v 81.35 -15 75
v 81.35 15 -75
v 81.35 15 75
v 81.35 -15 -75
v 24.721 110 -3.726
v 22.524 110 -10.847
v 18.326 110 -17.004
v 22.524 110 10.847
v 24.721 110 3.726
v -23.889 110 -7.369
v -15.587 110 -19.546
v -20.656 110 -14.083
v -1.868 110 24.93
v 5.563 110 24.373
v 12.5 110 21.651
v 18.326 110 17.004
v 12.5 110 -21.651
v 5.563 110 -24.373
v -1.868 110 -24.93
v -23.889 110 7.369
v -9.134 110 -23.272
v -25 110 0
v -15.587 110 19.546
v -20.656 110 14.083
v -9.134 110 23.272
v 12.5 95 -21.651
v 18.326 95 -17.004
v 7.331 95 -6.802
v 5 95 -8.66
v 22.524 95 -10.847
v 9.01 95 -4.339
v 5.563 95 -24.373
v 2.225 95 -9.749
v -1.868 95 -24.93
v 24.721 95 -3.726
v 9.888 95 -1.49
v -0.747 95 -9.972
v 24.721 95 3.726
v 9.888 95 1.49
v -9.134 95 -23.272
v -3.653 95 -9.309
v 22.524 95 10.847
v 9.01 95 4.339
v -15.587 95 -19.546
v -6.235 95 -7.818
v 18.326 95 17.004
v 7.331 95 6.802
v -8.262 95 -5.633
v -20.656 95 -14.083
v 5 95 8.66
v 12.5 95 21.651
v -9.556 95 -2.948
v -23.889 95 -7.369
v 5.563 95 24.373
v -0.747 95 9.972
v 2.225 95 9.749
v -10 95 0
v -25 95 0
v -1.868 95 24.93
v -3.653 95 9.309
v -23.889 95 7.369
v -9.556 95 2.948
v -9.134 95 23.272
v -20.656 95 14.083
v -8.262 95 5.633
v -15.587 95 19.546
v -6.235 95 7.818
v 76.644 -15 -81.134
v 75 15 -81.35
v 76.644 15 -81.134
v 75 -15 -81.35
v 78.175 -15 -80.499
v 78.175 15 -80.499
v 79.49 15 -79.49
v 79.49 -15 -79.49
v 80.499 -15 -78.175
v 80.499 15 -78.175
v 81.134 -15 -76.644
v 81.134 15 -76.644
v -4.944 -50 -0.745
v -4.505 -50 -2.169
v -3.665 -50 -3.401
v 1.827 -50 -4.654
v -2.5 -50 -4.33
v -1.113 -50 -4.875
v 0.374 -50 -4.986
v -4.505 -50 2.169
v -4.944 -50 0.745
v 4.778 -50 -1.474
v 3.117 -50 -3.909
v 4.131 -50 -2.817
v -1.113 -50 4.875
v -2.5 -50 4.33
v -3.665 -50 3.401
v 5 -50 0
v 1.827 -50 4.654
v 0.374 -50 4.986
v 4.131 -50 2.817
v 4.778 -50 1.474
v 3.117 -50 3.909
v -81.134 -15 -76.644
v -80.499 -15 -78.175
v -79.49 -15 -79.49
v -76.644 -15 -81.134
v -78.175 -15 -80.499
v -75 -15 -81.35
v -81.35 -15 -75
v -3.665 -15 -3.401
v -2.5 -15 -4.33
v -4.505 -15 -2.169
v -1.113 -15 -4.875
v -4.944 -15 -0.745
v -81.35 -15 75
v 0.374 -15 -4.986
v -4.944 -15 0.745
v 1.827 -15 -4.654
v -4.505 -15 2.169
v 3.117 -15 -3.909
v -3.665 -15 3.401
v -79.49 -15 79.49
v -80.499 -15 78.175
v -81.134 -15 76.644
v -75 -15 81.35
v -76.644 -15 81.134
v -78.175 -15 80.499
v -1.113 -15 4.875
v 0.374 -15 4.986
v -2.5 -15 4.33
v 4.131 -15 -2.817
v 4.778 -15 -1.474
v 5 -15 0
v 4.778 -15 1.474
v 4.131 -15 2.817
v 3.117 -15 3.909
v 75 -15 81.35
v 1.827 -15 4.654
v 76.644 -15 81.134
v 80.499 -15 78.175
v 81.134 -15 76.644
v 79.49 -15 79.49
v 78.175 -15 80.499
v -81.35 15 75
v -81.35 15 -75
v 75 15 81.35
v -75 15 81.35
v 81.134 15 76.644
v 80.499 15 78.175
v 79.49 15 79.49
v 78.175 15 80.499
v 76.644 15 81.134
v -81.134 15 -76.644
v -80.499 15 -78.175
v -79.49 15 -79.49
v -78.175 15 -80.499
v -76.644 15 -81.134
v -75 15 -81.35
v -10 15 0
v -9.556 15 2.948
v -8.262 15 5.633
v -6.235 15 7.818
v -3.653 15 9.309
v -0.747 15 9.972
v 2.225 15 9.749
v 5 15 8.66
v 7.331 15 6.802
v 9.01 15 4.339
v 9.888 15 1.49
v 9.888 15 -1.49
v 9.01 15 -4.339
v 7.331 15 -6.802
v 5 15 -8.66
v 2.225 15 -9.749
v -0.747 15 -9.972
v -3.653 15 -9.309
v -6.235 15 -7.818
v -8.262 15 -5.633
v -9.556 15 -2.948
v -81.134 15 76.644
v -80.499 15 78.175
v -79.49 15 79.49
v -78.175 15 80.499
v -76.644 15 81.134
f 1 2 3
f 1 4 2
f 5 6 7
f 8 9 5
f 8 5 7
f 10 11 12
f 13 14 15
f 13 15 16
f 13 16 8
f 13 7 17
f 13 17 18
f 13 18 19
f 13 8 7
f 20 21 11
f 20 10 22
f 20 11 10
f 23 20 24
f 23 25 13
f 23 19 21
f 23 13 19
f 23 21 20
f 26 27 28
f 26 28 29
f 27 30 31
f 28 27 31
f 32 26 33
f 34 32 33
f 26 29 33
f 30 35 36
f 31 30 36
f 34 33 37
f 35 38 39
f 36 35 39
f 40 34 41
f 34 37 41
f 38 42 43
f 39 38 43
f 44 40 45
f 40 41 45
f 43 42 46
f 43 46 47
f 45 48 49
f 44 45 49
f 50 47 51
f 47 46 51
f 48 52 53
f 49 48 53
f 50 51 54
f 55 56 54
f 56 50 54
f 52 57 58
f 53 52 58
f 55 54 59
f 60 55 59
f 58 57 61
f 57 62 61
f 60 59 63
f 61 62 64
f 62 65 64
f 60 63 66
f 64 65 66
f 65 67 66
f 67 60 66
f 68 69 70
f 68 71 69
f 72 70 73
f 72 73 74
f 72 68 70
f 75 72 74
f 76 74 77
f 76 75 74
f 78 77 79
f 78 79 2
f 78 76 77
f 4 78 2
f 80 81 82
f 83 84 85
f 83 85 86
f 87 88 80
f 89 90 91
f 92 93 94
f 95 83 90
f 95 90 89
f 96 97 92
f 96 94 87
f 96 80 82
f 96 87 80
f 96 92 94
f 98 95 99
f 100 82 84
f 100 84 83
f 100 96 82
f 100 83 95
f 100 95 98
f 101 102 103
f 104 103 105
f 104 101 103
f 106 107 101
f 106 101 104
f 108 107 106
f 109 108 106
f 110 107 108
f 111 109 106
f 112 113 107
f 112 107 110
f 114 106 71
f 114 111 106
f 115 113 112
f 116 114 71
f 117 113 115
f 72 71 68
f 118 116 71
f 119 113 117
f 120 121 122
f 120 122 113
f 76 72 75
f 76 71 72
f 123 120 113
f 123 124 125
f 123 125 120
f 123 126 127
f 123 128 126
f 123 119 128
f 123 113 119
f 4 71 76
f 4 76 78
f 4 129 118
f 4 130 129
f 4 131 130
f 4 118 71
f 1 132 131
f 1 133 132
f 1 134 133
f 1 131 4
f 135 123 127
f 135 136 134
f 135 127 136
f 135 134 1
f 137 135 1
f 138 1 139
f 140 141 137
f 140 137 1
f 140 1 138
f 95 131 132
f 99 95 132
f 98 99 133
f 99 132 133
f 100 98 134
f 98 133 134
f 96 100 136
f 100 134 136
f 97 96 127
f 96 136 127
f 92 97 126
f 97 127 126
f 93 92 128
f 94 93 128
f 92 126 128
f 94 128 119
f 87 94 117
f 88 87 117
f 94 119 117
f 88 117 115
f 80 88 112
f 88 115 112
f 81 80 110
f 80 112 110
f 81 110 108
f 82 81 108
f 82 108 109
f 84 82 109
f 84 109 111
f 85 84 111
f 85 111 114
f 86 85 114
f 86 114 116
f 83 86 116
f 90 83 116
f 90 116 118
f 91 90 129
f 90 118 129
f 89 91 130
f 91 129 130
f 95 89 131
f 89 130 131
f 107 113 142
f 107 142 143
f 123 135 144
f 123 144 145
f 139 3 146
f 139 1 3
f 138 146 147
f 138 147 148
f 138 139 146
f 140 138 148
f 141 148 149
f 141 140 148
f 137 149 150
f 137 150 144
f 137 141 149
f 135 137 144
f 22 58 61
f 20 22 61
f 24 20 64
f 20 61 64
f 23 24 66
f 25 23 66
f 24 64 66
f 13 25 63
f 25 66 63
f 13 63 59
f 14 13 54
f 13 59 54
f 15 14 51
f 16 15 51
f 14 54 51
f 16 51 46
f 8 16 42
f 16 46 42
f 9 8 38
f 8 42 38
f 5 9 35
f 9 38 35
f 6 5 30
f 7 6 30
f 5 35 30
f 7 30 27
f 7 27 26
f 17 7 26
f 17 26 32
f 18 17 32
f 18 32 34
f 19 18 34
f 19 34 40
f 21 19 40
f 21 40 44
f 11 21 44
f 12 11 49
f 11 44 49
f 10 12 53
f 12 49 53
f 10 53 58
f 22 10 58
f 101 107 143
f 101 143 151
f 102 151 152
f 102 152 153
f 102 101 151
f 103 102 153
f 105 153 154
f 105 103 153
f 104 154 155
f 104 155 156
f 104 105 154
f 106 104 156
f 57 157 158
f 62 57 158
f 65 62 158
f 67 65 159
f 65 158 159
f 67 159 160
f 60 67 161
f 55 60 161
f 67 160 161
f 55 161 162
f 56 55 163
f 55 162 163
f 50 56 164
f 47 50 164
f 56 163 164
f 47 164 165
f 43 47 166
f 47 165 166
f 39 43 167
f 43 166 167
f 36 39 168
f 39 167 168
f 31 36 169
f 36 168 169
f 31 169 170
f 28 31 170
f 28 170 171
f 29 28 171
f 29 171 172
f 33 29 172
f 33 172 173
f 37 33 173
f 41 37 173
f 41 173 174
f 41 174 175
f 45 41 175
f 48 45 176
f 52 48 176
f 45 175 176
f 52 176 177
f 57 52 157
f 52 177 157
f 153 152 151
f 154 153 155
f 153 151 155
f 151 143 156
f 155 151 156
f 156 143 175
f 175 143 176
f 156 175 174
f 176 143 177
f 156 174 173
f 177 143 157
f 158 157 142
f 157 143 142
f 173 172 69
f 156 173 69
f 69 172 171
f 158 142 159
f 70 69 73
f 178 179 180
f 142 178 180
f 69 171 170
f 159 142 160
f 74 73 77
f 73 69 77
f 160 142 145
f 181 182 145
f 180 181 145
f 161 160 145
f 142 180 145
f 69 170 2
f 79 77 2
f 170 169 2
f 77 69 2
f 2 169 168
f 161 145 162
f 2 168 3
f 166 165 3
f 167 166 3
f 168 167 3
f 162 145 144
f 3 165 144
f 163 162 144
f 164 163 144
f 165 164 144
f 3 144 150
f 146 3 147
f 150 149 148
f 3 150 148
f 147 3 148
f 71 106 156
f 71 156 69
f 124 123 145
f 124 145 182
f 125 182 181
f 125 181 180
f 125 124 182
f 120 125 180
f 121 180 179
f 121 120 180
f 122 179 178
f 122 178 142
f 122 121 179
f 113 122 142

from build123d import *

# Parameters (mm, degrees)
F1_DEPTH = 15
F2_R     = 5
F3_DEPTH = 35
F4_R     = 10
F5_DEPTH = 80
F6_R     = 25
F7_DEPTH = 15


with BuildPart() as f1:
    # F0 (on Front) → F1 (new body, symmetric)
    with BuildSketch(Plane.XZ):
        with BuildLine():
            ThreePointArc((81.35, 75), (79.4901280605, 79.4901280605), (75, 81.35))
            Line((75, 81.35), (-75, 81.35))
            ThreePointArc((-75, 81.35), (-79.4901280605, 79.4901280605), (-81.35, 75))
            Line((-81.35, 75), (-81.35, -75))
            ThreePointArc((-81.35, -75), (-79.4901280605, -79.4901280605), (-75, -81.35))
            Line((-75, -81.35), (75, -81.35))
            ThreePointArc((75, -81.35), (79.4901280605, -79.4901280605), (81.35, -75))
            Line((81.35, -75), (81.35, 75))
        make_face()
    extrude(amount=F1_DEPTH, both=True)

    # F2 (on face) → F3 (join)
    with BuildSketch(Plane.XZ.offset(15)):
        Circle(F2_R)
    extrude(amount=F3_DEPTH)

    # F4 (on face) → F5 (join)
    with BuildSketch(Plane(origin=(0, 15, 0), x_dir=(-1, 0, 0), z_dir=(0, 1, 0))):
        Circle(F4_R)
    extrude(amount=F5_DEPTH)

    # F6 (on face) → F7 (join)
    with BuildSketch(Plane(origin=(0, 95, 0), x_dir=(-1, 0, 0), z_dir=(0, 1, 0))):
        Circle(F6_R)
    extrude(amount=F7_DEPTH)


solid = f1.part
